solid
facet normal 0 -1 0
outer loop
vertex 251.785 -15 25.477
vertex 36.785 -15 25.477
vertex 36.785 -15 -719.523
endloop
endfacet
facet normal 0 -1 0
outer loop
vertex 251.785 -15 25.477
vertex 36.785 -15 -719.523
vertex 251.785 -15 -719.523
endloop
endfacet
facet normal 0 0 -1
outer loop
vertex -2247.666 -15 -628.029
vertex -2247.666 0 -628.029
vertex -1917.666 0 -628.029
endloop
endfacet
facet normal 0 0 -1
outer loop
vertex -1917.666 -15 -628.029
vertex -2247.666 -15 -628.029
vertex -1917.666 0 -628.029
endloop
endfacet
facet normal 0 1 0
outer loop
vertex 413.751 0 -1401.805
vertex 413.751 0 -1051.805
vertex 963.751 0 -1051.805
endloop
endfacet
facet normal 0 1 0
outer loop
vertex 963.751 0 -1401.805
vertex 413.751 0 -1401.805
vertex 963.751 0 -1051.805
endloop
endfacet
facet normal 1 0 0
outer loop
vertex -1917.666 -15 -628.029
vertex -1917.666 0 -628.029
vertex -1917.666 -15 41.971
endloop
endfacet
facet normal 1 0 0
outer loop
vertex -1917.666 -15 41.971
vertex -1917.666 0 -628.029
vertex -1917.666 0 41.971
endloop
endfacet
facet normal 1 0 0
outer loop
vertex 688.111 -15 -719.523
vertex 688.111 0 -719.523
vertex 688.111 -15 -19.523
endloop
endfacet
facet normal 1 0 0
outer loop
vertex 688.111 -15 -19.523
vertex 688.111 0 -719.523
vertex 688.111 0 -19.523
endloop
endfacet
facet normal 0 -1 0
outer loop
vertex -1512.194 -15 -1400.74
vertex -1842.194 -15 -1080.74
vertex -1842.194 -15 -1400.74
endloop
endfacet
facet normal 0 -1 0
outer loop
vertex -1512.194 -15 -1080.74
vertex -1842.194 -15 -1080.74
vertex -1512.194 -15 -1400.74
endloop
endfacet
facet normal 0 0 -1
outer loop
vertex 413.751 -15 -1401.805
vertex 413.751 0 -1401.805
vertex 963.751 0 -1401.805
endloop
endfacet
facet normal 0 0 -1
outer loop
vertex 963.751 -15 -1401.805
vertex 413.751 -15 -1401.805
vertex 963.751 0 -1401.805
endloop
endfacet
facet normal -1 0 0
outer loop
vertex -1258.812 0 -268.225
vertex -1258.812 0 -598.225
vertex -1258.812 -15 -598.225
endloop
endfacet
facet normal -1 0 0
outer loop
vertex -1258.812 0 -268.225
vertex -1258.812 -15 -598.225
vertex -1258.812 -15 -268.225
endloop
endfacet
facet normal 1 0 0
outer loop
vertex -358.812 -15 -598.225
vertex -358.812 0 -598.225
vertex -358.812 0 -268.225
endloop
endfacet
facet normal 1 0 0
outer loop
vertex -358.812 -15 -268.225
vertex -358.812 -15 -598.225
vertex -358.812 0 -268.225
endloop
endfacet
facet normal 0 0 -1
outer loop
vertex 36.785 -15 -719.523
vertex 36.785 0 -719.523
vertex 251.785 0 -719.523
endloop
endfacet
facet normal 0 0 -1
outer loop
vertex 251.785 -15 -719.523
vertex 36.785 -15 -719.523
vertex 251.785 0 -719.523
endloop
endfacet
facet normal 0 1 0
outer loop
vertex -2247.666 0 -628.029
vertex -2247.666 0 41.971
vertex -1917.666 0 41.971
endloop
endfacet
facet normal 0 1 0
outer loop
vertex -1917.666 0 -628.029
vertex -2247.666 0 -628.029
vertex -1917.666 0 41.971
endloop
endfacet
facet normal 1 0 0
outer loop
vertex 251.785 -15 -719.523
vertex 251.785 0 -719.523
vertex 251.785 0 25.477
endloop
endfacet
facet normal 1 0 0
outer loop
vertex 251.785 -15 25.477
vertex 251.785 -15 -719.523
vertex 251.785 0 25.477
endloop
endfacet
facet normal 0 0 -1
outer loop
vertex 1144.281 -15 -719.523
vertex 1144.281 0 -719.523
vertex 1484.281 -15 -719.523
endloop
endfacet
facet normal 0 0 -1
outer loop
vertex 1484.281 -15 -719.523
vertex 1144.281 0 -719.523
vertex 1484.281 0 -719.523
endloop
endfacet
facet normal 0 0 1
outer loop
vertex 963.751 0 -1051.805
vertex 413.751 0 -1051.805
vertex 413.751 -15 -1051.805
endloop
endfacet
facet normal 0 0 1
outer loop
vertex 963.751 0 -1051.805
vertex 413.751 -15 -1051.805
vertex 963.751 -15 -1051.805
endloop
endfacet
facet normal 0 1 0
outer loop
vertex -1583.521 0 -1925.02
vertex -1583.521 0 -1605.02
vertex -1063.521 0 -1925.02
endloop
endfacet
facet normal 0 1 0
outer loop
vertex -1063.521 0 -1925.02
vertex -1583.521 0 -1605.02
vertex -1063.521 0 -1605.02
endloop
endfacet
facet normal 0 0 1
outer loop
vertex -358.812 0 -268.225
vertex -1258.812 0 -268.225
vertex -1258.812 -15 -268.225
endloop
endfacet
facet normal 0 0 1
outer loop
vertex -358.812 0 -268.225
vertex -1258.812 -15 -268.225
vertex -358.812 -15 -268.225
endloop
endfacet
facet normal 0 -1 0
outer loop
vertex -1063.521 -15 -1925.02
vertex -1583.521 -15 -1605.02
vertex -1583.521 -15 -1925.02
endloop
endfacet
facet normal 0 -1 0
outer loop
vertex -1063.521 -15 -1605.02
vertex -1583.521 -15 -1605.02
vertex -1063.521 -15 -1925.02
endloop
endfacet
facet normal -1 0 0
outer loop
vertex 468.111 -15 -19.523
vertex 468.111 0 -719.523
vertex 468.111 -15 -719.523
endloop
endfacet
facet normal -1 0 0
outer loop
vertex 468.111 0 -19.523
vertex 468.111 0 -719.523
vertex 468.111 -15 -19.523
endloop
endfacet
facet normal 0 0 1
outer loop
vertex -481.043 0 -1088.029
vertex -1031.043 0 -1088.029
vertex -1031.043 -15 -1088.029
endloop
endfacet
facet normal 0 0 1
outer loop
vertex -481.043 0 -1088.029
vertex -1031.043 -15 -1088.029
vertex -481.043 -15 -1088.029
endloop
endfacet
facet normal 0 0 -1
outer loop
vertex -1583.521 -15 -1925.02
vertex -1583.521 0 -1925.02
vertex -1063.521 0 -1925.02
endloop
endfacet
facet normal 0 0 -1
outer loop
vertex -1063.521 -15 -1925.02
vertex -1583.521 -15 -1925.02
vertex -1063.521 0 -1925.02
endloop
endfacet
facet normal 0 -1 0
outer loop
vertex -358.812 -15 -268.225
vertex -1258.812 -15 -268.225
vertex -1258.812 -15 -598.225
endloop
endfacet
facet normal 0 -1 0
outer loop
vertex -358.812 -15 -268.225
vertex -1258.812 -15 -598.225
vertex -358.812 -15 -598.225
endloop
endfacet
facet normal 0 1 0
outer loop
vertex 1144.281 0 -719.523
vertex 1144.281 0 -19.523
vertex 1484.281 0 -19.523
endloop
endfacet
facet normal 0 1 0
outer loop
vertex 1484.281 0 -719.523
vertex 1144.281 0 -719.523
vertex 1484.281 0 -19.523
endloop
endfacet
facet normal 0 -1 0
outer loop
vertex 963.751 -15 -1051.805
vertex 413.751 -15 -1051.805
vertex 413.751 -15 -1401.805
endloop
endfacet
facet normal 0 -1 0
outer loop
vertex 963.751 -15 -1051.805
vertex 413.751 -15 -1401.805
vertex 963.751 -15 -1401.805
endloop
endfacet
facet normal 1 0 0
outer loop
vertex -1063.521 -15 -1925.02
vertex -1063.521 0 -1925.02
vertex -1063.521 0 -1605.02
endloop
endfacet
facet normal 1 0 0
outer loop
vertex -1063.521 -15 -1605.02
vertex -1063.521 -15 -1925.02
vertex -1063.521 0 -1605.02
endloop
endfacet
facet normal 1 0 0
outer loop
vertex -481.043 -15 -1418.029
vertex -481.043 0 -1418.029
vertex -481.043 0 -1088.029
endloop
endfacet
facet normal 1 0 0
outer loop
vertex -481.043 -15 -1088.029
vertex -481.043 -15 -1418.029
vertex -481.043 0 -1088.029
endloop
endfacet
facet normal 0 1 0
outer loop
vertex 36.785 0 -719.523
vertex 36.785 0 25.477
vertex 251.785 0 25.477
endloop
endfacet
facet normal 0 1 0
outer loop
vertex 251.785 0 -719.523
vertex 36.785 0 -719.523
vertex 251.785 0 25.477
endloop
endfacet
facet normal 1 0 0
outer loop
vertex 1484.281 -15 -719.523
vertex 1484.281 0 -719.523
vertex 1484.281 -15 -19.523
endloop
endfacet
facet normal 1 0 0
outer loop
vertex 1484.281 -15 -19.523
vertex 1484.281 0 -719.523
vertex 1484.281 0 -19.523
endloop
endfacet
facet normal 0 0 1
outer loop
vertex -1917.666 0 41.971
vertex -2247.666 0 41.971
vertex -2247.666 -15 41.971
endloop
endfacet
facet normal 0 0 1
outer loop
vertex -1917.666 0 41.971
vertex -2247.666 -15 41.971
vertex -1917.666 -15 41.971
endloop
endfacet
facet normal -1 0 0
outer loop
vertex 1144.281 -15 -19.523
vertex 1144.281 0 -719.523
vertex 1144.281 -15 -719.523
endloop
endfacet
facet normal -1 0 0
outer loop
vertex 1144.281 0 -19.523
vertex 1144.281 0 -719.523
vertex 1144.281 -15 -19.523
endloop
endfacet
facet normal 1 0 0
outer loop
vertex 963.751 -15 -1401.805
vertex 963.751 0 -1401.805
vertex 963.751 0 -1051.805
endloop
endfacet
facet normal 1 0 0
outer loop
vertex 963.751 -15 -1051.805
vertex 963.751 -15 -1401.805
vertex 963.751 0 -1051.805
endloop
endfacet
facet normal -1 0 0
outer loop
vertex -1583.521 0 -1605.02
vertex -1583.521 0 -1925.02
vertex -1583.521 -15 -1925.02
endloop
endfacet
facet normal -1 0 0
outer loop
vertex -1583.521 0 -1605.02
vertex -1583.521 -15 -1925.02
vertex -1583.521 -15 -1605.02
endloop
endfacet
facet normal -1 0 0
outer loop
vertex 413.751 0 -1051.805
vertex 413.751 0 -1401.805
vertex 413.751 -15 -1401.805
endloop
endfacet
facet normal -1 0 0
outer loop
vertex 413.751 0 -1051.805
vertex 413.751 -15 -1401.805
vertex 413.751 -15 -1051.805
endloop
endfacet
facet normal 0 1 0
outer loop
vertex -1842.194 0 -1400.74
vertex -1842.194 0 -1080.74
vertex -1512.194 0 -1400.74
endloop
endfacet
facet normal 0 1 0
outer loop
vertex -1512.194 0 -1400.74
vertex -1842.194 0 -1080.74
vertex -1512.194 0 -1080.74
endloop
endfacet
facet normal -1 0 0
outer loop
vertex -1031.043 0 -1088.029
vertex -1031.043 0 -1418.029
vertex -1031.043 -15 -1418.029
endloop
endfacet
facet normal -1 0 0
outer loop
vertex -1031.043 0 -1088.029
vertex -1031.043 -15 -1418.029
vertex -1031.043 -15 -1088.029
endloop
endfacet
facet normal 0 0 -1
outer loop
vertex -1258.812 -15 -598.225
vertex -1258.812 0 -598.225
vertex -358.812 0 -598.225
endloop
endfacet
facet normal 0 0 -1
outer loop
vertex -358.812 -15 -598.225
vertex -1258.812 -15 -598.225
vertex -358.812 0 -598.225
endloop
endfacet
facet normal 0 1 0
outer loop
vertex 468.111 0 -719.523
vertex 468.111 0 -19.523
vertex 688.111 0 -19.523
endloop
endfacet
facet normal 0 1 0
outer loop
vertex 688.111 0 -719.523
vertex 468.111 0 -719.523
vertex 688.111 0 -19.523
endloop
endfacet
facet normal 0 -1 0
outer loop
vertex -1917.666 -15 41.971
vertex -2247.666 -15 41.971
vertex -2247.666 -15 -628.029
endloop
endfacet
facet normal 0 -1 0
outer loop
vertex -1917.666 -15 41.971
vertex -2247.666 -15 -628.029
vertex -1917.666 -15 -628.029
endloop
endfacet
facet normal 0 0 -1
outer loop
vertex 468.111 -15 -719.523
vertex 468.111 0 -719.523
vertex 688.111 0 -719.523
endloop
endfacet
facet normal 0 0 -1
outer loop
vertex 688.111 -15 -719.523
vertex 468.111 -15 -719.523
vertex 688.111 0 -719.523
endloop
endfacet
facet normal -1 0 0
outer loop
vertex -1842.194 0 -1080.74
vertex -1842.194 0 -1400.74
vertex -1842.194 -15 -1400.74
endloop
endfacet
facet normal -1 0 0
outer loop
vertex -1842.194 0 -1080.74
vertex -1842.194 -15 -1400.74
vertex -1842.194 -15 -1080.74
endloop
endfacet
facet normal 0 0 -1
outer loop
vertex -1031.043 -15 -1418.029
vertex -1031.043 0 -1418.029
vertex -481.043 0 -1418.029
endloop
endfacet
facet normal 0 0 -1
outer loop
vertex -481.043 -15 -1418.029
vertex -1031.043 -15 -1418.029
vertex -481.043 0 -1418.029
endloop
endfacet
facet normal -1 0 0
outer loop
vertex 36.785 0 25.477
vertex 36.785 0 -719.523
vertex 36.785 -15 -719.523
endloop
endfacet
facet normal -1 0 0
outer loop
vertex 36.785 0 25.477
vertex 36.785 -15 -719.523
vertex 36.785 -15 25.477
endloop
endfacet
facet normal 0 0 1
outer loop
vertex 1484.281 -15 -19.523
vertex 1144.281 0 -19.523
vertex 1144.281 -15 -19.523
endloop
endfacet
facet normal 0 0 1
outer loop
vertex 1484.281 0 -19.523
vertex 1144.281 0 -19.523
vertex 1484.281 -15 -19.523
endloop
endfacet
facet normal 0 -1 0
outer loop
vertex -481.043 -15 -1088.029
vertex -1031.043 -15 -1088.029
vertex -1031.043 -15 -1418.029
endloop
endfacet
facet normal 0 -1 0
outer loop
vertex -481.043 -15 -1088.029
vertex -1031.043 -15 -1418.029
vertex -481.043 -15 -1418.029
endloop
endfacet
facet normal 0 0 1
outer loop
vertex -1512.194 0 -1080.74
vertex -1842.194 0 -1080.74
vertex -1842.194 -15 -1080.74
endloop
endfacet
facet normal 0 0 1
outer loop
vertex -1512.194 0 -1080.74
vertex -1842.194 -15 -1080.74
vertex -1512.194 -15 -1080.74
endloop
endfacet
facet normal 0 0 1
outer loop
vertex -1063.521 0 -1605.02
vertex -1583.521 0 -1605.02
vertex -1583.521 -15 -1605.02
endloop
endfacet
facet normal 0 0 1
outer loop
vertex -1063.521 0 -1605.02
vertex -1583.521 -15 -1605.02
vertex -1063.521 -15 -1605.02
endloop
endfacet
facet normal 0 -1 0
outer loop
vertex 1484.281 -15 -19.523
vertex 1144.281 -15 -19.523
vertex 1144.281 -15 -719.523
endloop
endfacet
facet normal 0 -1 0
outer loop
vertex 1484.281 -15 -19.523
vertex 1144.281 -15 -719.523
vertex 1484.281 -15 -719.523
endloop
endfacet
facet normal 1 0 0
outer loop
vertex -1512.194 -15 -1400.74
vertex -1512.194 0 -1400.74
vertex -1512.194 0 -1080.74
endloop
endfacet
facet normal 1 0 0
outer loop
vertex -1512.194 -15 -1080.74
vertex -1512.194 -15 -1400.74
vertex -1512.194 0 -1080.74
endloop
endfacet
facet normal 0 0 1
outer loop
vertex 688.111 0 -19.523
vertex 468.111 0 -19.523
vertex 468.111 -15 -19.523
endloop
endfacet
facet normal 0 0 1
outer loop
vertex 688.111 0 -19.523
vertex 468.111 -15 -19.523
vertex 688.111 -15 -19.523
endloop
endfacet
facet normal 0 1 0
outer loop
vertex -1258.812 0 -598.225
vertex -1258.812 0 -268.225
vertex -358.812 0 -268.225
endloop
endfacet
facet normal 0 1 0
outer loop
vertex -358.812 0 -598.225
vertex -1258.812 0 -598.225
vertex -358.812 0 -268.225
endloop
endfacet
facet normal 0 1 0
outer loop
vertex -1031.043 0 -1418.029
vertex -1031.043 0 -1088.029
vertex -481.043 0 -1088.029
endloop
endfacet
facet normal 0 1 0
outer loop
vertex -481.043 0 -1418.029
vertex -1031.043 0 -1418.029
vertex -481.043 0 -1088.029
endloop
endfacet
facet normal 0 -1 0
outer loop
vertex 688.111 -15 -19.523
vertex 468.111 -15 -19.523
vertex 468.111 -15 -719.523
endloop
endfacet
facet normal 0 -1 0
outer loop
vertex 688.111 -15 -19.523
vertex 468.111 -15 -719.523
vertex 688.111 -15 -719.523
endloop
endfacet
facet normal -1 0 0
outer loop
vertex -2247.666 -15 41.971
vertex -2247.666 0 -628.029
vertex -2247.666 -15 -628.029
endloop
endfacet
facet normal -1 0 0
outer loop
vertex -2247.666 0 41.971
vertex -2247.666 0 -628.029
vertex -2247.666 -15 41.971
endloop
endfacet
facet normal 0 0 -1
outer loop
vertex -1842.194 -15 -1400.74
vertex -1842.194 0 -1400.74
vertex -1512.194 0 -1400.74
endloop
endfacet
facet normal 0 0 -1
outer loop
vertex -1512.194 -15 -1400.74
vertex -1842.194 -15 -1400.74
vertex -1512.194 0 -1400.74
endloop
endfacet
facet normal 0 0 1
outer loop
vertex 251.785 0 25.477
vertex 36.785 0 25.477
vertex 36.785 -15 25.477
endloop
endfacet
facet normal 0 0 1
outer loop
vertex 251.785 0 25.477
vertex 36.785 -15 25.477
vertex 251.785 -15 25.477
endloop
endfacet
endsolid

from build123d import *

# Parameters (mm, degrees)
F0_W      = 340
F0_H      = 700
F1_DEPTH  = 15
F0_W_2    = 220
F2_DEPTH  = 15
F0_W_3    = 215
F0_H_2    = 745
F3_DEPTH  = 15
F4_W      = 900
F4_H      = 330
F5_DEPTH  = 15
F0_W_4    = 550
F0_H_3    = 350
F6_DEPTH  = 15
F4_W_2    = 330
F4_H_2    = 670
F7_DEPTH  = 15
F4_W_3    = 550
F8_DEPTH  = 15
F4_H_3    = 320
F9_DEPTH  = 15
F4_W_4    = 520
F10_DEPTH = 15


with BuildPart() as f1:
    # F0 (on Front) → F1 (new body)
    with BuildSketch(Plane.XZ):
        with Locations((1314.281249, -369.523013)):
            Rectangle(F0_W, F0_H)
    extrude(amount=F1_DEPTH)


with BuildPart() as f2:
    # F0 (on Front) → F2 (new body)
    with BuildSketch(Plane.XZ):
        with Locations((578.111008, -369.523013)):
            Rectangle(F0_W_2, F0_H)
    extrude(amount=F2_DEPTH)


with BuildPart() as f3:
    # F0 (on Front) → F3 (new body)
    with BuildSketch(Plane.XZ):
        with Locations((144.285066, -347.023013)):
            Rectangle(F0_W_3, F0_H_2)
    extrude(amount=F3_DEPTH)


with BuildPart() as f5:
    # F4 (on Front) → F5 (new body)
    with BuildSketch(Plane.XZ):
        with Locations((-808.811921, -433.225236)):
            Rectangle(F4_W, F4_H)
    extrude(amount=F5_DEPTH)


with BuildPart() as f6:
    # F0 (on Front) → F6 (new body)
    with BuildSketch(Plane.XZ):
        with Locations((688.751453, -1226.805162)):
            Rectangle(F0_W_4, F0_H_3)
    extrude(amount=F6_DEPTH)


with BuildPart() as f7:
    # F4 (on Front) → F7 (new body)
    with BuildSketch(Plane.XZ):
        with Locations((-2082.666001, -293.029227)):
            Rectangle(F4_W_2, F4_H_2)
    extrude(amount=F7_DEPTH)


with BuildPart() as f8:
    # F4 (on Front) → F8 (new body)
    with BuildSketch(Plane.XZ):
        with Locations((-756.04341, -1253.029189)):
            Rectangle(F4_W_3, F4_H)
    extrude(amount=F8_DEPTH)


with BuildPart() as f9:
    # F4 (on Front) → F9 (new body)
    with BuildSketch(Plane.XZ):
        with Locations((-1677.1942, -1240.739551)):
            Rectangle(F4_W_2, F4_H_3)
    extrude(amount=F9_DEPTH)


with BuildPart() as f10:
    # F4 (on Front) → F10 (new body)
    with BuildSketch(Plane.XZ):
        with Locations((-1323.52077, -1765.020337)):
            Rectangle(F4_W_4, F4_H_3)
    extrude(amount=F10_DEPTH)


solid = Compound([f1.part, f2.part, f3.part, f5.part, f6.part, f7.part, f8.part, f9.part, f10.part])
